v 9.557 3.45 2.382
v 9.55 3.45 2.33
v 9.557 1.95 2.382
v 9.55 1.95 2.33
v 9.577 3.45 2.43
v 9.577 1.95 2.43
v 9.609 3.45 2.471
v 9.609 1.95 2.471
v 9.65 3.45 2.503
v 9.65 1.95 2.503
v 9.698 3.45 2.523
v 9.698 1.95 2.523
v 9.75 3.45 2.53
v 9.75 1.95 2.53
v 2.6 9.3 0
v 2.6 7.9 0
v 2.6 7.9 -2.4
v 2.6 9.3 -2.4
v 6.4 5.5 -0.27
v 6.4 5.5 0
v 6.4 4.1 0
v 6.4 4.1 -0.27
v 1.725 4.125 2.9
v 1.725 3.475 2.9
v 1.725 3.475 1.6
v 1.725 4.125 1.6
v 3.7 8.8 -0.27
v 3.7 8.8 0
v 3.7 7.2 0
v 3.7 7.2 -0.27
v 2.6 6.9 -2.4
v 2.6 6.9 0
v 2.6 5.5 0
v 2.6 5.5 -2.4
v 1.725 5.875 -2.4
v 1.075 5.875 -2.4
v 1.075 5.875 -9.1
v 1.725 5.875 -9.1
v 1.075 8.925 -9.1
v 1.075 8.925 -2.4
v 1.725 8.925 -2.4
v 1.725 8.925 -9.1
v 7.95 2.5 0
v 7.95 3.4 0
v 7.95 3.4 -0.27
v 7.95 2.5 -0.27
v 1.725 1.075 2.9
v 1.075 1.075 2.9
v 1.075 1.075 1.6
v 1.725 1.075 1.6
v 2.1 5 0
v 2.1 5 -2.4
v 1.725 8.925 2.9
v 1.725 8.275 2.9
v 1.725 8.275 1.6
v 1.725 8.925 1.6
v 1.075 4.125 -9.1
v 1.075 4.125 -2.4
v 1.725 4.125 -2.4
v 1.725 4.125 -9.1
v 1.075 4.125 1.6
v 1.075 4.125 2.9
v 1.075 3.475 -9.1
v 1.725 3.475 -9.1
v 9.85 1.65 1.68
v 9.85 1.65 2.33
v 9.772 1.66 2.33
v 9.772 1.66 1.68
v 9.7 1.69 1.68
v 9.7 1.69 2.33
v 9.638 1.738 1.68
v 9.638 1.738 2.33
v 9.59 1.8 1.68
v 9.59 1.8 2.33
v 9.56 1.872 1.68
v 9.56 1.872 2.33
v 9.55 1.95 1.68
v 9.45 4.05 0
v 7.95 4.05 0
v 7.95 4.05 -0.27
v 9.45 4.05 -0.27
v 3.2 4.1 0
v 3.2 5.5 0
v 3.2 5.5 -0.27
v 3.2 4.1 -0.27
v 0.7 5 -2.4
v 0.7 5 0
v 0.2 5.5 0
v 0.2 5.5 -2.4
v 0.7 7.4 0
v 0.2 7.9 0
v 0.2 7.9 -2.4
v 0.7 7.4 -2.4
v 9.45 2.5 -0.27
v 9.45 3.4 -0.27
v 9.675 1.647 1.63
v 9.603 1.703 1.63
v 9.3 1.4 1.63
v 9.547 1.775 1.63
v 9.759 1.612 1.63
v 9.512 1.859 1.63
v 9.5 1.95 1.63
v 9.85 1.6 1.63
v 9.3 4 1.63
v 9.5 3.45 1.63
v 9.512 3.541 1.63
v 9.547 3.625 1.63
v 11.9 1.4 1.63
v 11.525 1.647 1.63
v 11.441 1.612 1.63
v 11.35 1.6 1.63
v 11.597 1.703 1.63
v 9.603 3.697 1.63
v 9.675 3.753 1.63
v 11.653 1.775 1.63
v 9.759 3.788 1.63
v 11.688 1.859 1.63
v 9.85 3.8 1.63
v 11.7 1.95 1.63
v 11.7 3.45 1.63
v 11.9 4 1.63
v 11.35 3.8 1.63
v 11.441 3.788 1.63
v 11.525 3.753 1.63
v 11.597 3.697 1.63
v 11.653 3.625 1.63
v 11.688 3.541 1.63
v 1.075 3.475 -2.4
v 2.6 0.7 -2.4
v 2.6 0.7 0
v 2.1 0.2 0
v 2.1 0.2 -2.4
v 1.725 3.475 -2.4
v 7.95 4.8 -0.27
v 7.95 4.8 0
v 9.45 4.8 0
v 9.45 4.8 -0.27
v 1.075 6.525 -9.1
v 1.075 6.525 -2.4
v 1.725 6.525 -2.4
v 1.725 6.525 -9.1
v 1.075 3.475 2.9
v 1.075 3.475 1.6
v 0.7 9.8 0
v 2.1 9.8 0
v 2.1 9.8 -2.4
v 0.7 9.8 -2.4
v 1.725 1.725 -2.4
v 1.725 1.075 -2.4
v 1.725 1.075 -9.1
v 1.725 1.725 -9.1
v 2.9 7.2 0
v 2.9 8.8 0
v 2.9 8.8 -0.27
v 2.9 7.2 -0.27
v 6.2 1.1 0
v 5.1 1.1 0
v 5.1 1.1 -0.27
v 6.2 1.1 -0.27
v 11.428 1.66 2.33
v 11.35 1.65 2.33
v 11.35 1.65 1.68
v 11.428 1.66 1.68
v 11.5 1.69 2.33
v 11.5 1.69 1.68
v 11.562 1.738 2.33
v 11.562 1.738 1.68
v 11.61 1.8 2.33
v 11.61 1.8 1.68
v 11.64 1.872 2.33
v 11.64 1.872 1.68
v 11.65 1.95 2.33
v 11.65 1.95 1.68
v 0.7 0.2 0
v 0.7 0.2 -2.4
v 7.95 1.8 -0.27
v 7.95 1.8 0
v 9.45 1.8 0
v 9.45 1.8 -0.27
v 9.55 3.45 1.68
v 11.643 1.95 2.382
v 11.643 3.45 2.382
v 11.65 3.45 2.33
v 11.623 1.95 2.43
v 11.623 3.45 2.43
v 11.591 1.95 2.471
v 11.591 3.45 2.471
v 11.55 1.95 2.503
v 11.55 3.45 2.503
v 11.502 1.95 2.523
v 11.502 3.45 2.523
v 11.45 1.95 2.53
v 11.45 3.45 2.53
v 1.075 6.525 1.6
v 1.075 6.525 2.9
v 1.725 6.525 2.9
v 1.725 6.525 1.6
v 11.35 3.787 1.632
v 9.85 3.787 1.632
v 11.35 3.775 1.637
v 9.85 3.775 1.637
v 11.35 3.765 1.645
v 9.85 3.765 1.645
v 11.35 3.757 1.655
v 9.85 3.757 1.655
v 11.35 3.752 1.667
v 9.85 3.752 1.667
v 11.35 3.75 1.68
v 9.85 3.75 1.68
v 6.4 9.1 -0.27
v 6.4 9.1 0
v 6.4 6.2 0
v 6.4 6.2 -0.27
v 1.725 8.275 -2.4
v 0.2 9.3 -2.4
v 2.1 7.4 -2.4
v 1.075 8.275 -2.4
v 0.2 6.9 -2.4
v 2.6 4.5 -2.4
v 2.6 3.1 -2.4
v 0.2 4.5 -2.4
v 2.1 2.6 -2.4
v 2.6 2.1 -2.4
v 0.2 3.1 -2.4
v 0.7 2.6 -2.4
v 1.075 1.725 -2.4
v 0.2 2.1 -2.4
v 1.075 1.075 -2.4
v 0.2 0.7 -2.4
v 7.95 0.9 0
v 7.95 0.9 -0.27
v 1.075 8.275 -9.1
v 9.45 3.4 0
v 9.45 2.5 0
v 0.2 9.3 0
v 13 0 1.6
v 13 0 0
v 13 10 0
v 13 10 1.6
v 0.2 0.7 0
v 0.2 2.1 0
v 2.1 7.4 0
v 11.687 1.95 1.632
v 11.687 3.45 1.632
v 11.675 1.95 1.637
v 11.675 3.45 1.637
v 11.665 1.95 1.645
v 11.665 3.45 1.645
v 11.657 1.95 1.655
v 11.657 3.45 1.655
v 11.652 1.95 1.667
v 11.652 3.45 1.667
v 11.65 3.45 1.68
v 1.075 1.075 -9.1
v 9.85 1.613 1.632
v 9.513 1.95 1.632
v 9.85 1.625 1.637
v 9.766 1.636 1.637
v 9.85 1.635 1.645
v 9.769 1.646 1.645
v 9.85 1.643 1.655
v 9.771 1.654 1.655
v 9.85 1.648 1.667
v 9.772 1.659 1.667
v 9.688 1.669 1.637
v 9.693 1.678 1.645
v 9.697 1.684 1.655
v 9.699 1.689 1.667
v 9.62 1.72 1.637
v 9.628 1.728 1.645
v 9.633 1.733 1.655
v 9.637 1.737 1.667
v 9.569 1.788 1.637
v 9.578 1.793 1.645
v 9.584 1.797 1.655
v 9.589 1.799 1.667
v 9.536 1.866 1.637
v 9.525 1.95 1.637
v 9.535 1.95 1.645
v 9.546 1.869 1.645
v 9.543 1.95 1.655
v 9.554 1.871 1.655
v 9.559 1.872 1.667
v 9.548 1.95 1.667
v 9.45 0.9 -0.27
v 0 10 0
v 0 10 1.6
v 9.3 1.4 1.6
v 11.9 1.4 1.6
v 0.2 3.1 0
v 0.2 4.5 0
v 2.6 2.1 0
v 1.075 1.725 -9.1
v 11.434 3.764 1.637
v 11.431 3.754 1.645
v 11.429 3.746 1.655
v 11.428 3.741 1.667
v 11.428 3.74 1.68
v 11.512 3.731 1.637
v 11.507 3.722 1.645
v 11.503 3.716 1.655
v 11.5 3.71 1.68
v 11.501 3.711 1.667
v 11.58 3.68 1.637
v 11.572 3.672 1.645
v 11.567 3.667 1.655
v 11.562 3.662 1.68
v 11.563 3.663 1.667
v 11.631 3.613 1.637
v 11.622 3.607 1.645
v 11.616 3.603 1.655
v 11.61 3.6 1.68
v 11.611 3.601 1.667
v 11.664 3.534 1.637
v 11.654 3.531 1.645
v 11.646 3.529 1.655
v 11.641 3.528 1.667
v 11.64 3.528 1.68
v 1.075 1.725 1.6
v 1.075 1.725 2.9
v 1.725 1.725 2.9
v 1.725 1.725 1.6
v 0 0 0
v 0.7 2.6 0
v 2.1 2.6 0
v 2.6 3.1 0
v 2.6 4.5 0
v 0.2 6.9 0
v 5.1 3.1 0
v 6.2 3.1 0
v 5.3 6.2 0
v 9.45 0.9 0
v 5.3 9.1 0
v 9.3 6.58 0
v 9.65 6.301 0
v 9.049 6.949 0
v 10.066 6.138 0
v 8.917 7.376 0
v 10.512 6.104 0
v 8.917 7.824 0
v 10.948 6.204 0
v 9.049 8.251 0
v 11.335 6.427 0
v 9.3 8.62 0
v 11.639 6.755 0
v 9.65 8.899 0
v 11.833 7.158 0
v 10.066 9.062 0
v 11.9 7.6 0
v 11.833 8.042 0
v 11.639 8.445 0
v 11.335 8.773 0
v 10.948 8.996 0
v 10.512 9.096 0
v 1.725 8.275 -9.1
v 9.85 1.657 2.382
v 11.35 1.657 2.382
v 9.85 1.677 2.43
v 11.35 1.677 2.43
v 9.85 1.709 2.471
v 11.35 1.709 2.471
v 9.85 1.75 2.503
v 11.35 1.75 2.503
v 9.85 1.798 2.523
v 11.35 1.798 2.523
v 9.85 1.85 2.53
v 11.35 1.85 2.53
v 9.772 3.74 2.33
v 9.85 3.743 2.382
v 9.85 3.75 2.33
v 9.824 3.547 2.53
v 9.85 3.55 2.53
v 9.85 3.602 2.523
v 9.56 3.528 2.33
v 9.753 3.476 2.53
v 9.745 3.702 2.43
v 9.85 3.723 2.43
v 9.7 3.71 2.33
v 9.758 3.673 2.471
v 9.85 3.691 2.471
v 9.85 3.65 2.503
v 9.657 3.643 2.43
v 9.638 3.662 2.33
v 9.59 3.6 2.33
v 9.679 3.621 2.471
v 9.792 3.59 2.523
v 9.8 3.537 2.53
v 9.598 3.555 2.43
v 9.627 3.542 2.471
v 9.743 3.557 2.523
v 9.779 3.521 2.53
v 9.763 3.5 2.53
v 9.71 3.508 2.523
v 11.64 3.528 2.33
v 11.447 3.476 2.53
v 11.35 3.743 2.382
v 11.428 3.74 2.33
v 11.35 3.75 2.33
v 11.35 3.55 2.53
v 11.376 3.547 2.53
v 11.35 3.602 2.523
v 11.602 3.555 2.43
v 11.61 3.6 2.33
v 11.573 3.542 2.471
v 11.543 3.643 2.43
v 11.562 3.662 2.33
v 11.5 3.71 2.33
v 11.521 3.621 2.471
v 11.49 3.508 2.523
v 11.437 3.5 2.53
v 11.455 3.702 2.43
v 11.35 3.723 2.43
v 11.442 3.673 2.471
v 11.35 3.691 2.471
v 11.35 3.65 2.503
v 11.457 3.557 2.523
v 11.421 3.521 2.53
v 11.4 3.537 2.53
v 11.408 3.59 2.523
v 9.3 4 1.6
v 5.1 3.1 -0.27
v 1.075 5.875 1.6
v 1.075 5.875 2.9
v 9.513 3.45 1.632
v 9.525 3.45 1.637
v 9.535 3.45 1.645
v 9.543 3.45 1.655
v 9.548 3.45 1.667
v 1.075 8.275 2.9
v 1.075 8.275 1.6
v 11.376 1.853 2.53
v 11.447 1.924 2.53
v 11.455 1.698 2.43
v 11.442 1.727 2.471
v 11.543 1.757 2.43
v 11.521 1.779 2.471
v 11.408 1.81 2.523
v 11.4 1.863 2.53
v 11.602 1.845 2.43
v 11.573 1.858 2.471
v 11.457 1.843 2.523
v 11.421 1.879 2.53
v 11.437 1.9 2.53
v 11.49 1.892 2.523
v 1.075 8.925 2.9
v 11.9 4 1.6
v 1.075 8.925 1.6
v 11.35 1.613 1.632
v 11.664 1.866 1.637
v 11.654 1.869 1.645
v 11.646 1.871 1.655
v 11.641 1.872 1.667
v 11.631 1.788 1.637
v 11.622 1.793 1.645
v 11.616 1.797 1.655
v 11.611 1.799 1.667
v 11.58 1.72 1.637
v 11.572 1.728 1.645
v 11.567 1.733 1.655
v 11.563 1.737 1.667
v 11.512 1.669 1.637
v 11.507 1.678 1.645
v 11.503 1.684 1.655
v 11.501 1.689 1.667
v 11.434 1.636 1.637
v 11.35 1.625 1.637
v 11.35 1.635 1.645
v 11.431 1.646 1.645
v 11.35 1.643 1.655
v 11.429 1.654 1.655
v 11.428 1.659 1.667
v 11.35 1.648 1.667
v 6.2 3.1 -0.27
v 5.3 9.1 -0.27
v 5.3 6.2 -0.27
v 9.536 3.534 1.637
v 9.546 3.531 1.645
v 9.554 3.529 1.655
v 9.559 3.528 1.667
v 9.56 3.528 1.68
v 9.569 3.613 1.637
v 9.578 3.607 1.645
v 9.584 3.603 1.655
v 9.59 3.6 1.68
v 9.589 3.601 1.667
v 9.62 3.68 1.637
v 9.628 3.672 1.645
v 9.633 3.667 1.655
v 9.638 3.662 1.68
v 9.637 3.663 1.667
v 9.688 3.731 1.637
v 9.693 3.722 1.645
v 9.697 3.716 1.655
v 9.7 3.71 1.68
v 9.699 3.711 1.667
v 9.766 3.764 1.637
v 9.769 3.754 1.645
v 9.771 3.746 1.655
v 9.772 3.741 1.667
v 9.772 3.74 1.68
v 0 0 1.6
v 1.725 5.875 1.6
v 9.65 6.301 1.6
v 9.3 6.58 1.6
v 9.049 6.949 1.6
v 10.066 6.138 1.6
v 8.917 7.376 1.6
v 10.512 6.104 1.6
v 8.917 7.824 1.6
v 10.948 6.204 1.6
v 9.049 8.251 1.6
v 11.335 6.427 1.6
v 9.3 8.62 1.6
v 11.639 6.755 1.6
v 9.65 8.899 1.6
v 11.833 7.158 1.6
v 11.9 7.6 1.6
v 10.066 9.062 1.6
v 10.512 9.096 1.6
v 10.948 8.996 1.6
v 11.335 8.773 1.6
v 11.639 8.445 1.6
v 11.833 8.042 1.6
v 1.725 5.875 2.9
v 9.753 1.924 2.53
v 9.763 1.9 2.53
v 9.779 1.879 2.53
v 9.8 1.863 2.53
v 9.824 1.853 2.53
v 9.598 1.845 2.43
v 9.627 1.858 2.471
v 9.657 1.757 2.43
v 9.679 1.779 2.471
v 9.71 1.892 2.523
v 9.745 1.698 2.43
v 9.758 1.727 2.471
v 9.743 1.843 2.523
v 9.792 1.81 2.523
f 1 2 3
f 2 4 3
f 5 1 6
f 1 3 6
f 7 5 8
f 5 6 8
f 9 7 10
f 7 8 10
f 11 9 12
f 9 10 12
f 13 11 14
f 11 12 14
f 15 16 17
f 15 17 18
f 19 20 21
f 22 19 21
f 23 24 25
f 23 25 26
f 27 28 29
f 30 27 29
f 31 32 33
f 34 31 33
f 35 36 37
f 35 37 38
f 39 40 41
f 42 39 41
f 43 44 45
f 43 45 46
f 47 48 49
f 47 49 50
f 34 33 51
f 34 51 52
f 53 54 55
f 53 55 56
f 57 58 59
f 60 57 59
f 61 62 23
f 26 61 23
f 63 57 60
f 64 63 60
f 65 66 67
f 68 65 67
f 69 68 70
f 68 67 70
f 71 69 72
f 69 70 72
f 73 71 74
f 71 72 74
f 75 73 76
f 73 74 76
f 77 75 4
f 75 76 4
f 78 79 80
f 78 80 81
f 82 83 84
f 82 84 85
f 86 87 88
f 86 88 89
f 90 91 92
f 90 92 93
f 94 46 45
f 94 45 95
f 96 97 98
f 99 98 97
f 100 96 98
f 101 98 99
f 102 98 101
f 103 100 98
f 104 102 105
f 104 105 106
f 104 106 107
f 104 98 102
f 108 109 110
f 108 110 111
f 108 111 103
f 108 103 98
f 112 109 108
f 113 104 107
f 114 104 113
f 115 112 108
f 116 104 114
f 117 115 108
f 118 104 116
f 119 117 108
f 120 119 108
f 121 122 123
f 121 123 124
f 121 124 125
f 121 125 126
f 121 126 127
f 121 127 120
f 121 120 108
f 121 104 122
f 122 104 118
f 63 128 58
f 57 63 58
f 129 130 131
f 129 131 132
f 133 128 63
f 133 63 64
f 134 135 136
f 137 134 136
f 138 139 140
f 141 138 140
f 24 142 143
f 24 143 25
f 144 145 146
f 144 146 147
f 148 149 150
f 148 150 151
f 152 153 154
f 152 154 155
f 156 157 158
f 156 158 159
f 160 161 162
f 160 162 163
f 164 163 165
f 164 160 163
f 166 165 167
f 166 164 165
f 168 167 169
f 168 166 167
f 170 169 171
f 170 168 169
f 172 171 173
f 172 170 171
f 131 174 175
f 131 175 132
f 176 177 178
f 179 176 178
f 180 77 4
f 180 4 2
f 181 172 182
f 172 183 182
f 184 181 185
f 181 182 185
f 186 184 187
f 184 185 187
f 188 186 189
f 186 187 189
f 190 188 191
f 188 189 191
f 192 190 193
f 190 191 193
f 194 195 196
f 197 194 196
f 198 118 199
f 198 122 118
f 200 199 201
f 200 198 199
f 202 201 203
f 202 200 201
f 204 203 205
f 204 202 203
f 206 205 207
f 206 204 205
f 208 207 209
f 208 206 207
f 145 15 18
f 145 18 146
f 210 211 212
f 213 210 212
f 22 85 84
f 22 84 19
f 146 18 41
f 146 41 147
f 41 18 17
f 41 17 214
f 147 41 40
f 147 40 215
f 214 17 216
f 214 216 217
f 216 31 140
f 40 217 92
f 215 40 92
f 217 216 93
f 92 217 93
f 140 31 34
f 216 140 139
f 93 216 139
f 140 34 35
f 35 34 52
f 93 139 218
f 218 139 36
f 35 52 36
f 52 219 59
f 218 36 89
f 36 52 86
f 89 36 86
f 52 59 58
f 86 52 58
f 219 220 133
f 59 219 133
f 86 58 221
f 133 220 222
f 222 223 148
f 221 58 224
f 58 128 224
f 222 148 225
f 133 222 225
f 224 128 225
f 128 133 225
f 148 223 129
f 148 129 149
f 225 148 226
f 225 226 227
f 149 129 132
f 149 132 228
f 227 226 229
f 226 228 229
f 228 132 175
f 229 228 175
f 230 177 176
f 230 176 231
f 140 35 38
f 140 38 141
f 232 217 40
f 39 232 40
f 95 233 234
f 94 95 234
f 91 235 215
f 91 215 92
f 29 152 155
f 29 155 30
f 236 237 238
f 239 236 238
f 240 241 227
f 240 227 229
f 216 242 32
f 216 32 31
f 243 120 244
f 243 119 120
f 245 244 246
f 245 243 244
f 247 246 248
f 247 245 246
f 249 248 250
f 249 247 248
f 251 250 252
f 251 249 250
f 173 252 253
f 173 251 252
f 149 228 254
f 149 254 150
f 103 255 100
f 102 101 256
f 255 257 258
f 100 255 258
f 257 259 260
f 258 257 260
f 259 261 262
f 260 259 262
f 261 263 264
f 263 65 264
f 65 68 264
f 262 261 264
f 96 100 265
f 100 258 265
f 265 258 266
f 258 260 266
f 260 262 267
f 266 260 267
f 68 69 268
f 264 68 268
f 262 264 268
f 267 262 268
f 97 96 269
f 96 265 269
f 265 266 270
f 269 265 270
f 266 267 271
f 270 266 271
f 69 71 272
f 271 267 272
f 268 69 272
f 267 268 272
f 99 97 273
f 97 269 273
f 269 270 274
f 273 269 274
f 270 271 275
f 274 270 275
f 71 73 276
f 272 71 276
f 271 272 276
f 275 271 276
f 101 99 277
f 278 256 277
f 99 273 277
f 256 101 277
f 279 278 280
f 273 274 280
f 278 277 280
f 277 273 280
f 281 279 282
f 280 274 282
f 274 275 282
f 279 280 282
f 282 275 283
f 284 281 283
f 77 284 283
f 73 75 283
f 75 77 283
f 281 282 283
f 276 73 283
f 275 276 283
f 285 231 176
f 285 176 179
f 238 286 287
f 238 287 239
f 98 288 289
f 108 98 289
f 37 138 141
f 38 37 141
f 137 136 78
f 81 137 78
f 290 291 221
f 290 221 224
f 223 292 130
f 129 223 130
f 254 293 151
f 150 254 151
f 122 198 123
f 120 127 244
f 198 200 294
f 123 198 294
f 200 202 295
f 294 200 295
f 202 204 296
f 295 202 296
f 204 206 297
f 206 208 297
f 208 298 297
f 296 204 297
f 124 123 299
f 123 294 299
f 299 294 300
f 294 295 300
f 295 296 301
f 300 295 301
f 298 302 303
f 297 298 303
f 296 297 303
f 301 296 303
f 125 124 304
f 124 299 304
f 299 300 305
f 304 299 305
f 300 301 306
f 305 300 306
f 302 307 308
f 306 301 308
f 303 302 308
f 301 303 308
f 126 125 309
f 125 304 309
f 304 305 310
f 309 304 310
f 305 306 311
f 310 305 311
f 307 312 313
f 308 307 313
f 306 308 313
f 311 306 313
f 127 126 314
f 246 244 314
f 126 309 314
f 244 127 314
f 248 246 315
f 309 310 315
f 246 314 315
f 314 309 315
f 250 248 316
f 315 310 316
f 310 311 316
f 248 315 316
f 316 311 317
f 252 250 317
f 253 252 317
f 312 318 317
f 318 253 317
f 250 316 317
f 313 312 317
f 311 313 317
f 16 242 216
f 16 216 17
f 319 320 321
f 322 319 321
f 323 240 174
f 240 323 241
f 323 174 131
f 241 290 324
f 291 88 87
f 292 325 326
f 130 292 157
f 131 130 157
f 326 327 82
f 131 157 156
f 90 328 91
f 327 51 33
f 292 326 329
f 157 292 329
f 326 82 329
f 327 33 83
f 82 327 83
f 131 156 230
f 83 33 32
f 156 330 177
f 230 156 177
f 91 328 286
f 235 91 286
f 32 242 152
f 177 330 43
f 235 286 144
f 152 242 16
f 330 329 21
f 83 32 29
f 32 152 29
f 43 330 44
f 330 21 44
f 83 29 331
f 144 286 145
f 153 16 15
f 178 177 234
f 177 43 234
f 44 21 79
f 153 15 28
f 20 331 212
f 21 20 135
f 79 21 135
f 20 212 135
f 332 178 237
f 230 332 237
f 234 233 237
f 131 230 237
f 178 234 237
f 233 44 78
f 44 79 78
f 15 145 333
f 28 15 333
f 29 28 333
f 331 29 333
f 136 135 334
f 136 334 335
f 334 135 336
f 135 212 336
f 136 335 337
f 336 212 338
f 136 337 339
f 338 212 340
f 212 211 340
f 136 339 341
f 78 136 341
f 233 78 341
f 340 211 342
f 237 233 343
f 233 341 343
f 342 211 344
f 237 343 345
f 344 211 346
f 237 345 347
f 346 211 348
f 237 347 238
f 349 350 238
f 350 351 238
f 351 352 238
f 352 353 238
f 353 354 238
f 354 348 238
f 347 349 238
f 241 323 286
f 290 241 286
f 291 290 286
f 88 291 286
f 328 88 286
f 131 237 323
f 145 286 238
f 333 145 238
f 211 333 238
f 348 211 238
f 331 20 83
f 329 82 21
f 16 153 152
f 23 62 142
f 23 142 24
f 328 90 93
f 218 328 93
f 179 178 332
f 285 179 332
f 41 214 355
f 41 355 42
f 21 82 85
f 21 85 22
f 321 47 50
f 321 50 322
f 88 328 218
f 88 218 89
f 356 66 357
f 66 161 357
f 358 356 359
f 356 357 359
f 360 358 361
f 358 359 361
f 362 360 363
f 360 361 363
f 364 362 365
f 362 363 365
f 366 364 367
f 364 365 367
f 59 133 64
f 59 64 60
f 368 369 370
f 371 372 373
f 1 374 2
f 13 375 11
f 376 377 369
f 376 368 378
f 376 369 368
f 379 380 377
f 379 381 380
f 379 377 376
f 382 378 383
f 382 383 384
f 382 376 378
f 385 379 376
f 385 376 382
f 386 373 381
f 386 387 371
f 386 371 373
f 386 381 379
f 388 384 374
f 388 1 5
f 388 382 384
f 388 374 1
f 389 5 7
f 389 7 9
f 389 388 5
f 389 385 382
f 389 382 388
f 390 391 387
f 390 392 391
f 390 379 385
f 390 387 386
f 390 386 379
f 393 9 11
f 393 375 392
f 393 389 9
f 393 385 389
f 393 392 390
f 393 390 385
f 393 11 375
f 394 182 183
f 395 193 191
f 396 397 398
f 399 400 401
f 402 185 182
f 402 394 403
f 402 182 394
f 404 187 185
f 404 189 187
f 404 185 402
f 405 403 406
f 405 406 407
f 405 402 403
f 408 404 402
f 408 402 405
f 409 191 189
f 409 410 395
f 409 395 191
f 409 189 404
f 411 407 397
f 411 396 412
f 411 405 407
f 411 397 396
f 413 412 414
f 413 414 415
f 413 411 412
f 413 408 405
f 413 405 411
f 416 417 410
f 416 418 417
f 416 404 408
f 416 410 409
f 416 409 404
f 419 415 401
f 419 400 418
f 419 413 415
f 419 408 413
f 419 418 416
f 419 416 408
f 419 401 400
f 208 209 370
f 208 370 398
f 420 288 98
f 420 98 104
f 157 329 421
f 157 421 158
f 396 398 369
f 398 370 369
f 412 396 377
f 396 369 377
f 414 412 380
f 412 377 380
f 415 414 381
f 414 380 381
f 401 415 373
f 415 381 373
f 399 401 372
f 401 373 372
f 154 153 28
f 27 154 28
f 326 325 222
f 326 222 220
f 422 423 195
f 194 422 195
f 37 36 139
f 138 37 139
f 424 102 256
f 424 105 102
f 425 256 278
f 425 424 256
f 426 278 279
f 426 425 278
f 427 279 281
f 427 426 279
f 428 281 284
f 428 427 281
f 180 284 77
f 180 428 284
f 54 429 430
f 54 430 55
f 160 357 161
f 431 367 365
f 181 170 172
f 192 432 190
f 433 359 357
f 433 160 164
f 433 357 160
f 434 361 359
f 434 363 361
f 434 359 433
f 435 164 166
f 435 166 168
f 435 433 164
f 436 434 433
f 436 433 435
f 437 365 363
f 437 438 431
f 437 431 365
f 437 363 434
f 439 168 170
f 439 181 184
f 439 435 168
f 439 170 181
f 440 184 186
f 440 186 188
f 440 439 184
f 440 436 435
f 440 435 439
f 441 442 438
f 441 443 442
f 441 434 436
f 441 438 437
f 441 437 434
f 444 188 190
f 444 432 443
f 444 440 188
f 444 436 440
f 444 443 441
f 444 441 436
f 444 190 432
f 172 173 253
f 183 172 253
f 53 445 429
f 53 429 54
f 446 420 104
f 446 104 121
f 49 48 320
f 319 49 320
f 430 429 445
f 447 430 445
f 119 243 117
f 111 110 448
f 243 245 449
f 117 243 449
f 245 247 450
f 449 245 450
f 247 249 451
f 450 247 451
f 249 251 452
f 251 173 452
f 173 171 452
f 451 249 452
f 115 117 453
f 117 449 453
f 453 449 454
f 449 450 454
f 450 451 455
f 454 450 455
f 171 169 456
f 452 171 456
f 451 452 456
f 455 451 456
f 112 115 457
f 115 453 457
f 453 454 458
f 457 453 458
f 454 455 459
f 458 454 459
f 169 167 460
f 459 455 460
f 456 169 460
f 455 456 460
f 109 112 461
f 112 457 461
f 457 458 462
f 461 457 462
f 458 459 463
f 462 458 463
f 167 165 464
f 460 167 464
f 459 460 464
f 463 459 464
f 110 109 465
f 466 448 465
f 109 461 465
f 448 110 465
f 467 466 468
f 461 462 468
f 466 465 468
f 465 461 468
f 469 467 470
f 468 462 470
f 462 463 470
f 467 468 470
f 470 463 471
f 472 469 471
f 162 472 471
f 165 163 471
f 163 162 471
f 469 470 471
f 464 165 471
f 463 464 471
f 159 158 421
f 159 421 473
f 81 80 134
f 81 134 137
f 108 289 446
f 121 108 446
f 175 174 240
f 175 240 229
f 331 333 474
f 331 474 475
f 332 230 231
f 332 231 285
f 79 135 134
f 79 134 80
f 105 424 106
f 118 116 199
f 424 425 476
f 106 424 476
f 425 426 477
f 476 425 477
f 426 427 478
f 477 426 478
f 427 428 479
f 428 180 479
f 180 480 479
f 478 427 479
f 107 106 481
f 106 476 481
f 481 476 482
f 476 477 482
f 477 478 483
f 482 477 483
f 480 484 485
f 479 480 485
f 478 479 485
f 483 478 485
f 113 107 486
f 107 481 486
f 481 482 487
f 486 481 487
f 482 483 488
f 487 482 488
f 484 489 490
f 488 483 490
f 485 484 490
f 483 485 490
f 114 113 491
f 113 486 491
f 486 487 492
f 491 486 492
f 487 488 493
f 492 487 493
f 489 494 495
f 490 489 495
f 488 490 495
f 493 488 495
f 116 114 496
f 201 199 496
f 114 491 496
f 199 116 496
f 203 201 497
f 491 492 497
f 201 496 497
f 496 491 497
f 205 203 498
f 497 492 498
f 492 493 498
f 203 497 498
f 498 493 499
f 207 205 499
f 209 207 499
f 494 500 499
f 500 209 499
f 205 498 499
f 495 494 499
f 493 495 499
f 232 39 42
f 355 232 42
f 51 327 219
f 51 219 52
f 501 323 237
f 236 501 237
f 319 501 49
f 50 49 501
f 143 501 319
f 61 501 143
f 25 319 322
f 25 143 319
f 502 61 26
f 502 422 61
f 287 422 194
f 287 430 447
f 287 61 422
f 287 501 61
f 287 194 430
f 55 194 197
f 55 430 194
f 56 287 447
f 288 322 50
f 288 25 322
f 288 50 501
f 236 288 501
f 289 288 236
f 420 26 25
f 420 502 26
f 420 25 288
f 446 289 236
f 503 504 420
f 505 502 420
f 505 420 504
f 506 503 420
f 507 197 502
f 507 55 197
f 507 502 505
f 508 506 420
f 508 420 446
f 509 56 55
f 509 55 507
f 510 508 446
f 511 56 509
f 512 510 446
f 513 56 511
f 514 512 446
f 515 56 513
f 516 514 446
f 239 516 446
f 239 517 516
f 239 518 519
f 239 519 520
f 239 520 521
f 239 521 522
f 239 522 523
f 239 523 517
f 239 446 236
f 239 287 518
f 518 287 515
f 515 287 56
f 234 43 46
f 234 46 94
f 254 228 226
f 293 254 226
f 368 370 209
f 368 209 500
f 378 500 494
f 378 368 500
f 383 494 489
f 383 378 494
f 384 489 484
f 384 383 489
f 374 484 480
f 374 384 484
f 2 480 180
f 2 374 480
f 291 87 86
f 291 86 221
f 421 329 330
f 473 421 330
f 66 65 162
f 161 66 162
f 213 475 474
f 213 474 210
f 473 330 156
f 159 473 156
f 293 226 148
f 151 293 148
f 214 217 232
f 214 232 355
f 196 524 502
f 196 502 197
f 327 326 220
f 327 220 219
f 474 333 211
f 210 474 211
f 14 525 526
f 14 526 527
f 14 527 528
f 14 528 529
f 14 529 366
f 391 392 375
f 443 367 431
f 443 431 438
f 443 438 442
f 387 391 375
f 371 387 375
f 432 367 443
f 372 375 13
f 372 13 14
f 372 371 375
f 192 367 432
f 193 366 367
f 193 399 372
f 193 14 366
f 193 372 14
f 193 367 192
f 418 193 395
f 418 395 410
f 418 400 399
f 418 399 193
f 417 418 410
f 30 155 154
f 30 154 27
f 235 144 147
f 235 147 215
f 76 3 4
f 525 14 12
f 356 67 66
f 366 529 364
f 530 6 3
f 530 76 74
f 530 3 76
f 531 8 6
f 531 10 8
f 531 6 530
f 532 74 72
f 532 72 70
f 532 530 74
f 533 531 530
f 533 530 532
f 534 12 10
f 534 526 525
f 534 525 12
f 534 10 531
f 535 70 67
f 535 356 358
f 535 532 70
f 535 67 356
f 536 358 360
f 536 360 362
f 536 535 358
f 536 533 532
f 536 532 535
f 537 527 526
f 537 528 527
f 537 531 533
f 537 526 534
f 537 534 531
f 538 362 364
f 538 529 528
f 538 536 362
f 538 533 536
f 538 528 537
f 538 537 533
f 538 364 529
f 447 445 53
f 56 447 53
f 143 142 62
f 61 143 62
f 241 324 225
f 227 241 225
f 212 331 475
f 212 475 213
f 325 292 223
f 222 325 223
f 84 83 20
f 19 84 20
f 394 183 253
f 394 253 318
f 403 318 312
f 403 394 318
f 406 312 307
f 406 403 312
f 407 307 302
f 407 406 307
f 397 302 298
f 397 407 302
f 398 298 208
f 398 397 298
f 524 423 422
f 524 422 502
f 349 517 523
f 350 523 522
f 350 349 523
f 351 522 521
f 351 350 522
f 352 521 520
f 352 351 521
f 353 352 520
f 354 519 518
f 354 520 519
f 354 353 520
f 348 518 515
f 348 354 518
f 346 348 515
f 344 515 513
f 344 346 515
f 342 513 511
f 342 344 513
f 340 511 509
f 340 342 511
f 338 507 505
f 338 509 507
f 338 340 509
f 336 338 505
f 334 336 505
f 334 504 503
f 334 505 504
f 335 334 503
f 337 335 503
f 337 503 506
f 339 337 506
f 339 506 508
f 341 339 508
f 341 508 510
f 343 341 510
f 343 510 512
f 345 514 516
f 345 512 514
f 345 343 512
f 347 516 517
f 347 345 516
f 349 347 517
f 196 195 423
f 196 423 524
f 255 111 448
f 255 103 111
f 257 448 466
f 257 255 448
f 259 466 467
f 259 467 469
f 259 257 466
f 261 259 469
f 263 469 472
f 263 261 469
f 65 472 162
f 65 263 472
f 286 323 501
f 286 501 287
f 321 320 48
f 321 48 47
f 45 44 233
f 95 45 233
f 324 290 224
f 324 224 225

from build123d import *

# Parameters (mm, degrees)
SKETCH_W      = 13
SKETCH_H      = 10
PAD_DEPTH     = 1.6
SKETCH001_R   = 1.5
SKETCH001_W   = 0.65
SKETCH001_H   = 0.65
POCKET_DEPTH  = 5
SKETCH002_W   = 2.6
SKETCH002_H   = 2.6
PAD001_DEPTH  = 0.03
SKETCH003_W   = 2.1
SKETCH003_H   = 2.1
PAD002_DEPTH  = 0.9
FILLET_R      = 0.3
FILLET001_R   = 0.05
FILLET002_R   = 0.2
SKETCH004_W   = 1.1
SKETCH004_H   = 2
SKETCH004_W_2 = 1.5
SKETCH004_H_2 = 0.9
SKETCH004_H_3 = 0.75
SKETCH004_H_4 = 2.9
SKETCH004_W_3 = 3.2
SKETCH004_H_5 = 1.4
SKETCH004_W_4 = 0.8
SKETCH004_H_6 = 1.6
PAD003_DEPTH  = 0.27
SKETCH005_W   = 2.4
SKETCH005_H   = 2.4
PAD004_DEPTH  = 2.4
CHAMFER_SIZE  = 0.5
PAD005_DEPTH  = 2.4
SKETCH007_W   = 0.65
SKETCH007_H   = 0.65
PAD006_DEPTH  = 12


with BuildPart() as part:
    # Sketch (on XY_Plane of Origin) → Pad (new body)
    with BuildSketch(Plane.XY):
        with Locations((6.5, 5)):
            Rectangle(SKETCH_W, SKETCH_H)
    extrude(amount=PAD_DEPTH)

    # Sketch001 (on XY_Plane of Origin) → Pocket (cut)
    with BuildSketch(Plane.XY):
        with Locations((10.4, 7.6)):
            Circle(SKETCH001_R)
        with Locations((1.4, 8.6)):
            Rectangle(SKETCH001_W, SKETCH001_H)
        with Locations((1.4, 6.2)):
            Rectangle(SKETCH001_W, SKETCH001_H)
        with Locations((1.4, 3.8)):
            Rectangle(SKETCH001_W, SKETCH001_H)
        with Locations((1.4, 1.4)):
            Rectangle(SKETCH001_W, SKETCH001_H)
    extrude(amount=POCKET_DEPTH, mode=Mode.SUBTRACT)

    # Sketch002 (on Face5 of Pocket) → Pad001 (join)
    with BuildSketch(Plane.XY.offset(1.6)):
        with Locations((10.6, 2.7)):
            Rectangle(SKETCH002_W, SKETCH002_H)
    extrude(amount=PAD001_DEPTH)

    # Sketch003 (on Face28 of Pad001) → Pad002 (join)
    with BuildSketch(Plane.XY.offset(1.63)):
        with Locations((10.6, 2.7)):
            Rectangle(SKETCH003_W, SKETCH003_H)
    extrude(amount=PAD002_DEPTH)

    # Fillet
    fillet_edges = [part.edges().sort_by_distance(p)[0] for p in [
        (9.55, 1.65, 2.08),
        (9.55, 3.75, 2.08),
        (11.65, 1.65, 2.08),
        (11.65, 3.75, 2.08),
    ]]
    fillet(fillet_edges, radius=FILLET_R)

    # Fillet001
    fillet001_edges = [part.edges().sort_by_distance(p)[0] for p in [
        (9.637868, 1.737868, 1.63),
    ]]
    fillet(fillet001_edges, radius=FILLET001_R)

    # Fillet002
    fillet002_edges = [part.edges().sort_by_distance(p)[0] for p in [
        (10.6, 1.65, 2.53),
    ]]
    fillet(fillet002_edges, radius=FILLET002_R)

    # Sketch004 (on Face53 of Fillet002) → Pad003 (join)
    with BuildSketch(Plane(origin=(0, 0, 0), x_dir=(1, 0, 0), z_dir=(0, 0, -1))):
        with Locations((5.65, -2.1)):
            Rectangle(SKETCH004_W, SKETCH004_H)
        with Locations((8.7, -1.35)):
            Rectangle(SKETCH004_W_2, SKETCH004_H_2)
        with Locations((8.7, -2.95)):
            Rectangle(SKETCH004_W_2, SKETCH004_H_2)
        with Locations((8.7, -4.425)):
            Rectangle(SKETCH004_W_2, SKETCH004_H_3)
        with Locations((5.85, -7.65)):
            Rectangle(SKETCH004_W, SKETCH004_H_4)
        with Locations((4.8, -4.8)):
            Rectangle(SKETCH004_W_3, SKETCH004_H_5)
        with Locations((3.3, -8)):
            Rectangle(SKETCH004_W_4, SKETCH004_H_6)
    extrude(amount=PAD003_DEPTH)

    # Sketch005 (on Face53 of Pad003) → Pad004 (join)
    with BuildSketch(Plane(origin=(0, 0, 0), x_dir=(1, 0, 0), z_dir=(0, 0, -1))):
        with Locations((1.4, -1.4)):
            Rectangle(SKETCH005_W, SKETCH005_H)
        with Locations((1.4, -6.2)):
            Rectangle(SKETCH005_W, SKETCH005_H)
    extrude(amount=PAD004_DEPTH)

    # Chamfer
    chamfer_edges = [part.edges().sort_by_distance(p)[0] for p in [
        (2.6, 5, -1.2),
        (0.2, 5, -1.2),
        (2.6, 7.4, -1.2),
        (2.6, 2.6, -1.2),
        (2.6, 0.2, -1.2),
        (0.2, 0.2, -1.2),
        (0.2, 7.4, -1.2),
        (0.2, 2.6, -1.2),
    ]]
    chamfer(chamfer_edges, length=CHAMFER_SIZE)

    # Sketch006 (on Face1 of Chamfer) → Pad005 (join)
    with BuildSketch(Plane(origin=(0, 0, 0), x_dir=(1, 0, 0), z_dir=(0, 0, -1))):
        Polygon((0.7, -2.6), (2.1, -2.6), (2.6, -3.1), (2.6, -4.5), (2.1, -5), (0.7, -5), (0.2, -4.5), (0.2, -3.1), align=None)
        Polygon((0.7, -7.4), (2.1, -7.4), (2.6, -7.9), (2.6, -9.3), (2.1, -9.8), (0.7, -9.8), (0.2, -9.3), (0.2, -7.9), align=None)
    extrude(amount=PAD005_DEPTH)

    # Sketch007 (on Face61 of Pad005) → Pad006 (join)
    with BuildSketch(Plane.XY.offset(2.9)):
        with Locations((1.4, 8.6)):
            Rectangle(SKETCH007_W, SKETCH007_H)
        with Locations((1.4, 6.2)):
            Rectangle(SKETCH007_W, SKETCH007_H)
        with Locations((1.4, 3.8)):
            Rectangle(SKETCH007_W, SKETCH007_H)
        with Locations((1.4, 1.4)):
            Rectangle(SKETCH007_W, SKETCH007_H)
    extrude(amount=-PAD006_DEPTH)


solid = part.part
